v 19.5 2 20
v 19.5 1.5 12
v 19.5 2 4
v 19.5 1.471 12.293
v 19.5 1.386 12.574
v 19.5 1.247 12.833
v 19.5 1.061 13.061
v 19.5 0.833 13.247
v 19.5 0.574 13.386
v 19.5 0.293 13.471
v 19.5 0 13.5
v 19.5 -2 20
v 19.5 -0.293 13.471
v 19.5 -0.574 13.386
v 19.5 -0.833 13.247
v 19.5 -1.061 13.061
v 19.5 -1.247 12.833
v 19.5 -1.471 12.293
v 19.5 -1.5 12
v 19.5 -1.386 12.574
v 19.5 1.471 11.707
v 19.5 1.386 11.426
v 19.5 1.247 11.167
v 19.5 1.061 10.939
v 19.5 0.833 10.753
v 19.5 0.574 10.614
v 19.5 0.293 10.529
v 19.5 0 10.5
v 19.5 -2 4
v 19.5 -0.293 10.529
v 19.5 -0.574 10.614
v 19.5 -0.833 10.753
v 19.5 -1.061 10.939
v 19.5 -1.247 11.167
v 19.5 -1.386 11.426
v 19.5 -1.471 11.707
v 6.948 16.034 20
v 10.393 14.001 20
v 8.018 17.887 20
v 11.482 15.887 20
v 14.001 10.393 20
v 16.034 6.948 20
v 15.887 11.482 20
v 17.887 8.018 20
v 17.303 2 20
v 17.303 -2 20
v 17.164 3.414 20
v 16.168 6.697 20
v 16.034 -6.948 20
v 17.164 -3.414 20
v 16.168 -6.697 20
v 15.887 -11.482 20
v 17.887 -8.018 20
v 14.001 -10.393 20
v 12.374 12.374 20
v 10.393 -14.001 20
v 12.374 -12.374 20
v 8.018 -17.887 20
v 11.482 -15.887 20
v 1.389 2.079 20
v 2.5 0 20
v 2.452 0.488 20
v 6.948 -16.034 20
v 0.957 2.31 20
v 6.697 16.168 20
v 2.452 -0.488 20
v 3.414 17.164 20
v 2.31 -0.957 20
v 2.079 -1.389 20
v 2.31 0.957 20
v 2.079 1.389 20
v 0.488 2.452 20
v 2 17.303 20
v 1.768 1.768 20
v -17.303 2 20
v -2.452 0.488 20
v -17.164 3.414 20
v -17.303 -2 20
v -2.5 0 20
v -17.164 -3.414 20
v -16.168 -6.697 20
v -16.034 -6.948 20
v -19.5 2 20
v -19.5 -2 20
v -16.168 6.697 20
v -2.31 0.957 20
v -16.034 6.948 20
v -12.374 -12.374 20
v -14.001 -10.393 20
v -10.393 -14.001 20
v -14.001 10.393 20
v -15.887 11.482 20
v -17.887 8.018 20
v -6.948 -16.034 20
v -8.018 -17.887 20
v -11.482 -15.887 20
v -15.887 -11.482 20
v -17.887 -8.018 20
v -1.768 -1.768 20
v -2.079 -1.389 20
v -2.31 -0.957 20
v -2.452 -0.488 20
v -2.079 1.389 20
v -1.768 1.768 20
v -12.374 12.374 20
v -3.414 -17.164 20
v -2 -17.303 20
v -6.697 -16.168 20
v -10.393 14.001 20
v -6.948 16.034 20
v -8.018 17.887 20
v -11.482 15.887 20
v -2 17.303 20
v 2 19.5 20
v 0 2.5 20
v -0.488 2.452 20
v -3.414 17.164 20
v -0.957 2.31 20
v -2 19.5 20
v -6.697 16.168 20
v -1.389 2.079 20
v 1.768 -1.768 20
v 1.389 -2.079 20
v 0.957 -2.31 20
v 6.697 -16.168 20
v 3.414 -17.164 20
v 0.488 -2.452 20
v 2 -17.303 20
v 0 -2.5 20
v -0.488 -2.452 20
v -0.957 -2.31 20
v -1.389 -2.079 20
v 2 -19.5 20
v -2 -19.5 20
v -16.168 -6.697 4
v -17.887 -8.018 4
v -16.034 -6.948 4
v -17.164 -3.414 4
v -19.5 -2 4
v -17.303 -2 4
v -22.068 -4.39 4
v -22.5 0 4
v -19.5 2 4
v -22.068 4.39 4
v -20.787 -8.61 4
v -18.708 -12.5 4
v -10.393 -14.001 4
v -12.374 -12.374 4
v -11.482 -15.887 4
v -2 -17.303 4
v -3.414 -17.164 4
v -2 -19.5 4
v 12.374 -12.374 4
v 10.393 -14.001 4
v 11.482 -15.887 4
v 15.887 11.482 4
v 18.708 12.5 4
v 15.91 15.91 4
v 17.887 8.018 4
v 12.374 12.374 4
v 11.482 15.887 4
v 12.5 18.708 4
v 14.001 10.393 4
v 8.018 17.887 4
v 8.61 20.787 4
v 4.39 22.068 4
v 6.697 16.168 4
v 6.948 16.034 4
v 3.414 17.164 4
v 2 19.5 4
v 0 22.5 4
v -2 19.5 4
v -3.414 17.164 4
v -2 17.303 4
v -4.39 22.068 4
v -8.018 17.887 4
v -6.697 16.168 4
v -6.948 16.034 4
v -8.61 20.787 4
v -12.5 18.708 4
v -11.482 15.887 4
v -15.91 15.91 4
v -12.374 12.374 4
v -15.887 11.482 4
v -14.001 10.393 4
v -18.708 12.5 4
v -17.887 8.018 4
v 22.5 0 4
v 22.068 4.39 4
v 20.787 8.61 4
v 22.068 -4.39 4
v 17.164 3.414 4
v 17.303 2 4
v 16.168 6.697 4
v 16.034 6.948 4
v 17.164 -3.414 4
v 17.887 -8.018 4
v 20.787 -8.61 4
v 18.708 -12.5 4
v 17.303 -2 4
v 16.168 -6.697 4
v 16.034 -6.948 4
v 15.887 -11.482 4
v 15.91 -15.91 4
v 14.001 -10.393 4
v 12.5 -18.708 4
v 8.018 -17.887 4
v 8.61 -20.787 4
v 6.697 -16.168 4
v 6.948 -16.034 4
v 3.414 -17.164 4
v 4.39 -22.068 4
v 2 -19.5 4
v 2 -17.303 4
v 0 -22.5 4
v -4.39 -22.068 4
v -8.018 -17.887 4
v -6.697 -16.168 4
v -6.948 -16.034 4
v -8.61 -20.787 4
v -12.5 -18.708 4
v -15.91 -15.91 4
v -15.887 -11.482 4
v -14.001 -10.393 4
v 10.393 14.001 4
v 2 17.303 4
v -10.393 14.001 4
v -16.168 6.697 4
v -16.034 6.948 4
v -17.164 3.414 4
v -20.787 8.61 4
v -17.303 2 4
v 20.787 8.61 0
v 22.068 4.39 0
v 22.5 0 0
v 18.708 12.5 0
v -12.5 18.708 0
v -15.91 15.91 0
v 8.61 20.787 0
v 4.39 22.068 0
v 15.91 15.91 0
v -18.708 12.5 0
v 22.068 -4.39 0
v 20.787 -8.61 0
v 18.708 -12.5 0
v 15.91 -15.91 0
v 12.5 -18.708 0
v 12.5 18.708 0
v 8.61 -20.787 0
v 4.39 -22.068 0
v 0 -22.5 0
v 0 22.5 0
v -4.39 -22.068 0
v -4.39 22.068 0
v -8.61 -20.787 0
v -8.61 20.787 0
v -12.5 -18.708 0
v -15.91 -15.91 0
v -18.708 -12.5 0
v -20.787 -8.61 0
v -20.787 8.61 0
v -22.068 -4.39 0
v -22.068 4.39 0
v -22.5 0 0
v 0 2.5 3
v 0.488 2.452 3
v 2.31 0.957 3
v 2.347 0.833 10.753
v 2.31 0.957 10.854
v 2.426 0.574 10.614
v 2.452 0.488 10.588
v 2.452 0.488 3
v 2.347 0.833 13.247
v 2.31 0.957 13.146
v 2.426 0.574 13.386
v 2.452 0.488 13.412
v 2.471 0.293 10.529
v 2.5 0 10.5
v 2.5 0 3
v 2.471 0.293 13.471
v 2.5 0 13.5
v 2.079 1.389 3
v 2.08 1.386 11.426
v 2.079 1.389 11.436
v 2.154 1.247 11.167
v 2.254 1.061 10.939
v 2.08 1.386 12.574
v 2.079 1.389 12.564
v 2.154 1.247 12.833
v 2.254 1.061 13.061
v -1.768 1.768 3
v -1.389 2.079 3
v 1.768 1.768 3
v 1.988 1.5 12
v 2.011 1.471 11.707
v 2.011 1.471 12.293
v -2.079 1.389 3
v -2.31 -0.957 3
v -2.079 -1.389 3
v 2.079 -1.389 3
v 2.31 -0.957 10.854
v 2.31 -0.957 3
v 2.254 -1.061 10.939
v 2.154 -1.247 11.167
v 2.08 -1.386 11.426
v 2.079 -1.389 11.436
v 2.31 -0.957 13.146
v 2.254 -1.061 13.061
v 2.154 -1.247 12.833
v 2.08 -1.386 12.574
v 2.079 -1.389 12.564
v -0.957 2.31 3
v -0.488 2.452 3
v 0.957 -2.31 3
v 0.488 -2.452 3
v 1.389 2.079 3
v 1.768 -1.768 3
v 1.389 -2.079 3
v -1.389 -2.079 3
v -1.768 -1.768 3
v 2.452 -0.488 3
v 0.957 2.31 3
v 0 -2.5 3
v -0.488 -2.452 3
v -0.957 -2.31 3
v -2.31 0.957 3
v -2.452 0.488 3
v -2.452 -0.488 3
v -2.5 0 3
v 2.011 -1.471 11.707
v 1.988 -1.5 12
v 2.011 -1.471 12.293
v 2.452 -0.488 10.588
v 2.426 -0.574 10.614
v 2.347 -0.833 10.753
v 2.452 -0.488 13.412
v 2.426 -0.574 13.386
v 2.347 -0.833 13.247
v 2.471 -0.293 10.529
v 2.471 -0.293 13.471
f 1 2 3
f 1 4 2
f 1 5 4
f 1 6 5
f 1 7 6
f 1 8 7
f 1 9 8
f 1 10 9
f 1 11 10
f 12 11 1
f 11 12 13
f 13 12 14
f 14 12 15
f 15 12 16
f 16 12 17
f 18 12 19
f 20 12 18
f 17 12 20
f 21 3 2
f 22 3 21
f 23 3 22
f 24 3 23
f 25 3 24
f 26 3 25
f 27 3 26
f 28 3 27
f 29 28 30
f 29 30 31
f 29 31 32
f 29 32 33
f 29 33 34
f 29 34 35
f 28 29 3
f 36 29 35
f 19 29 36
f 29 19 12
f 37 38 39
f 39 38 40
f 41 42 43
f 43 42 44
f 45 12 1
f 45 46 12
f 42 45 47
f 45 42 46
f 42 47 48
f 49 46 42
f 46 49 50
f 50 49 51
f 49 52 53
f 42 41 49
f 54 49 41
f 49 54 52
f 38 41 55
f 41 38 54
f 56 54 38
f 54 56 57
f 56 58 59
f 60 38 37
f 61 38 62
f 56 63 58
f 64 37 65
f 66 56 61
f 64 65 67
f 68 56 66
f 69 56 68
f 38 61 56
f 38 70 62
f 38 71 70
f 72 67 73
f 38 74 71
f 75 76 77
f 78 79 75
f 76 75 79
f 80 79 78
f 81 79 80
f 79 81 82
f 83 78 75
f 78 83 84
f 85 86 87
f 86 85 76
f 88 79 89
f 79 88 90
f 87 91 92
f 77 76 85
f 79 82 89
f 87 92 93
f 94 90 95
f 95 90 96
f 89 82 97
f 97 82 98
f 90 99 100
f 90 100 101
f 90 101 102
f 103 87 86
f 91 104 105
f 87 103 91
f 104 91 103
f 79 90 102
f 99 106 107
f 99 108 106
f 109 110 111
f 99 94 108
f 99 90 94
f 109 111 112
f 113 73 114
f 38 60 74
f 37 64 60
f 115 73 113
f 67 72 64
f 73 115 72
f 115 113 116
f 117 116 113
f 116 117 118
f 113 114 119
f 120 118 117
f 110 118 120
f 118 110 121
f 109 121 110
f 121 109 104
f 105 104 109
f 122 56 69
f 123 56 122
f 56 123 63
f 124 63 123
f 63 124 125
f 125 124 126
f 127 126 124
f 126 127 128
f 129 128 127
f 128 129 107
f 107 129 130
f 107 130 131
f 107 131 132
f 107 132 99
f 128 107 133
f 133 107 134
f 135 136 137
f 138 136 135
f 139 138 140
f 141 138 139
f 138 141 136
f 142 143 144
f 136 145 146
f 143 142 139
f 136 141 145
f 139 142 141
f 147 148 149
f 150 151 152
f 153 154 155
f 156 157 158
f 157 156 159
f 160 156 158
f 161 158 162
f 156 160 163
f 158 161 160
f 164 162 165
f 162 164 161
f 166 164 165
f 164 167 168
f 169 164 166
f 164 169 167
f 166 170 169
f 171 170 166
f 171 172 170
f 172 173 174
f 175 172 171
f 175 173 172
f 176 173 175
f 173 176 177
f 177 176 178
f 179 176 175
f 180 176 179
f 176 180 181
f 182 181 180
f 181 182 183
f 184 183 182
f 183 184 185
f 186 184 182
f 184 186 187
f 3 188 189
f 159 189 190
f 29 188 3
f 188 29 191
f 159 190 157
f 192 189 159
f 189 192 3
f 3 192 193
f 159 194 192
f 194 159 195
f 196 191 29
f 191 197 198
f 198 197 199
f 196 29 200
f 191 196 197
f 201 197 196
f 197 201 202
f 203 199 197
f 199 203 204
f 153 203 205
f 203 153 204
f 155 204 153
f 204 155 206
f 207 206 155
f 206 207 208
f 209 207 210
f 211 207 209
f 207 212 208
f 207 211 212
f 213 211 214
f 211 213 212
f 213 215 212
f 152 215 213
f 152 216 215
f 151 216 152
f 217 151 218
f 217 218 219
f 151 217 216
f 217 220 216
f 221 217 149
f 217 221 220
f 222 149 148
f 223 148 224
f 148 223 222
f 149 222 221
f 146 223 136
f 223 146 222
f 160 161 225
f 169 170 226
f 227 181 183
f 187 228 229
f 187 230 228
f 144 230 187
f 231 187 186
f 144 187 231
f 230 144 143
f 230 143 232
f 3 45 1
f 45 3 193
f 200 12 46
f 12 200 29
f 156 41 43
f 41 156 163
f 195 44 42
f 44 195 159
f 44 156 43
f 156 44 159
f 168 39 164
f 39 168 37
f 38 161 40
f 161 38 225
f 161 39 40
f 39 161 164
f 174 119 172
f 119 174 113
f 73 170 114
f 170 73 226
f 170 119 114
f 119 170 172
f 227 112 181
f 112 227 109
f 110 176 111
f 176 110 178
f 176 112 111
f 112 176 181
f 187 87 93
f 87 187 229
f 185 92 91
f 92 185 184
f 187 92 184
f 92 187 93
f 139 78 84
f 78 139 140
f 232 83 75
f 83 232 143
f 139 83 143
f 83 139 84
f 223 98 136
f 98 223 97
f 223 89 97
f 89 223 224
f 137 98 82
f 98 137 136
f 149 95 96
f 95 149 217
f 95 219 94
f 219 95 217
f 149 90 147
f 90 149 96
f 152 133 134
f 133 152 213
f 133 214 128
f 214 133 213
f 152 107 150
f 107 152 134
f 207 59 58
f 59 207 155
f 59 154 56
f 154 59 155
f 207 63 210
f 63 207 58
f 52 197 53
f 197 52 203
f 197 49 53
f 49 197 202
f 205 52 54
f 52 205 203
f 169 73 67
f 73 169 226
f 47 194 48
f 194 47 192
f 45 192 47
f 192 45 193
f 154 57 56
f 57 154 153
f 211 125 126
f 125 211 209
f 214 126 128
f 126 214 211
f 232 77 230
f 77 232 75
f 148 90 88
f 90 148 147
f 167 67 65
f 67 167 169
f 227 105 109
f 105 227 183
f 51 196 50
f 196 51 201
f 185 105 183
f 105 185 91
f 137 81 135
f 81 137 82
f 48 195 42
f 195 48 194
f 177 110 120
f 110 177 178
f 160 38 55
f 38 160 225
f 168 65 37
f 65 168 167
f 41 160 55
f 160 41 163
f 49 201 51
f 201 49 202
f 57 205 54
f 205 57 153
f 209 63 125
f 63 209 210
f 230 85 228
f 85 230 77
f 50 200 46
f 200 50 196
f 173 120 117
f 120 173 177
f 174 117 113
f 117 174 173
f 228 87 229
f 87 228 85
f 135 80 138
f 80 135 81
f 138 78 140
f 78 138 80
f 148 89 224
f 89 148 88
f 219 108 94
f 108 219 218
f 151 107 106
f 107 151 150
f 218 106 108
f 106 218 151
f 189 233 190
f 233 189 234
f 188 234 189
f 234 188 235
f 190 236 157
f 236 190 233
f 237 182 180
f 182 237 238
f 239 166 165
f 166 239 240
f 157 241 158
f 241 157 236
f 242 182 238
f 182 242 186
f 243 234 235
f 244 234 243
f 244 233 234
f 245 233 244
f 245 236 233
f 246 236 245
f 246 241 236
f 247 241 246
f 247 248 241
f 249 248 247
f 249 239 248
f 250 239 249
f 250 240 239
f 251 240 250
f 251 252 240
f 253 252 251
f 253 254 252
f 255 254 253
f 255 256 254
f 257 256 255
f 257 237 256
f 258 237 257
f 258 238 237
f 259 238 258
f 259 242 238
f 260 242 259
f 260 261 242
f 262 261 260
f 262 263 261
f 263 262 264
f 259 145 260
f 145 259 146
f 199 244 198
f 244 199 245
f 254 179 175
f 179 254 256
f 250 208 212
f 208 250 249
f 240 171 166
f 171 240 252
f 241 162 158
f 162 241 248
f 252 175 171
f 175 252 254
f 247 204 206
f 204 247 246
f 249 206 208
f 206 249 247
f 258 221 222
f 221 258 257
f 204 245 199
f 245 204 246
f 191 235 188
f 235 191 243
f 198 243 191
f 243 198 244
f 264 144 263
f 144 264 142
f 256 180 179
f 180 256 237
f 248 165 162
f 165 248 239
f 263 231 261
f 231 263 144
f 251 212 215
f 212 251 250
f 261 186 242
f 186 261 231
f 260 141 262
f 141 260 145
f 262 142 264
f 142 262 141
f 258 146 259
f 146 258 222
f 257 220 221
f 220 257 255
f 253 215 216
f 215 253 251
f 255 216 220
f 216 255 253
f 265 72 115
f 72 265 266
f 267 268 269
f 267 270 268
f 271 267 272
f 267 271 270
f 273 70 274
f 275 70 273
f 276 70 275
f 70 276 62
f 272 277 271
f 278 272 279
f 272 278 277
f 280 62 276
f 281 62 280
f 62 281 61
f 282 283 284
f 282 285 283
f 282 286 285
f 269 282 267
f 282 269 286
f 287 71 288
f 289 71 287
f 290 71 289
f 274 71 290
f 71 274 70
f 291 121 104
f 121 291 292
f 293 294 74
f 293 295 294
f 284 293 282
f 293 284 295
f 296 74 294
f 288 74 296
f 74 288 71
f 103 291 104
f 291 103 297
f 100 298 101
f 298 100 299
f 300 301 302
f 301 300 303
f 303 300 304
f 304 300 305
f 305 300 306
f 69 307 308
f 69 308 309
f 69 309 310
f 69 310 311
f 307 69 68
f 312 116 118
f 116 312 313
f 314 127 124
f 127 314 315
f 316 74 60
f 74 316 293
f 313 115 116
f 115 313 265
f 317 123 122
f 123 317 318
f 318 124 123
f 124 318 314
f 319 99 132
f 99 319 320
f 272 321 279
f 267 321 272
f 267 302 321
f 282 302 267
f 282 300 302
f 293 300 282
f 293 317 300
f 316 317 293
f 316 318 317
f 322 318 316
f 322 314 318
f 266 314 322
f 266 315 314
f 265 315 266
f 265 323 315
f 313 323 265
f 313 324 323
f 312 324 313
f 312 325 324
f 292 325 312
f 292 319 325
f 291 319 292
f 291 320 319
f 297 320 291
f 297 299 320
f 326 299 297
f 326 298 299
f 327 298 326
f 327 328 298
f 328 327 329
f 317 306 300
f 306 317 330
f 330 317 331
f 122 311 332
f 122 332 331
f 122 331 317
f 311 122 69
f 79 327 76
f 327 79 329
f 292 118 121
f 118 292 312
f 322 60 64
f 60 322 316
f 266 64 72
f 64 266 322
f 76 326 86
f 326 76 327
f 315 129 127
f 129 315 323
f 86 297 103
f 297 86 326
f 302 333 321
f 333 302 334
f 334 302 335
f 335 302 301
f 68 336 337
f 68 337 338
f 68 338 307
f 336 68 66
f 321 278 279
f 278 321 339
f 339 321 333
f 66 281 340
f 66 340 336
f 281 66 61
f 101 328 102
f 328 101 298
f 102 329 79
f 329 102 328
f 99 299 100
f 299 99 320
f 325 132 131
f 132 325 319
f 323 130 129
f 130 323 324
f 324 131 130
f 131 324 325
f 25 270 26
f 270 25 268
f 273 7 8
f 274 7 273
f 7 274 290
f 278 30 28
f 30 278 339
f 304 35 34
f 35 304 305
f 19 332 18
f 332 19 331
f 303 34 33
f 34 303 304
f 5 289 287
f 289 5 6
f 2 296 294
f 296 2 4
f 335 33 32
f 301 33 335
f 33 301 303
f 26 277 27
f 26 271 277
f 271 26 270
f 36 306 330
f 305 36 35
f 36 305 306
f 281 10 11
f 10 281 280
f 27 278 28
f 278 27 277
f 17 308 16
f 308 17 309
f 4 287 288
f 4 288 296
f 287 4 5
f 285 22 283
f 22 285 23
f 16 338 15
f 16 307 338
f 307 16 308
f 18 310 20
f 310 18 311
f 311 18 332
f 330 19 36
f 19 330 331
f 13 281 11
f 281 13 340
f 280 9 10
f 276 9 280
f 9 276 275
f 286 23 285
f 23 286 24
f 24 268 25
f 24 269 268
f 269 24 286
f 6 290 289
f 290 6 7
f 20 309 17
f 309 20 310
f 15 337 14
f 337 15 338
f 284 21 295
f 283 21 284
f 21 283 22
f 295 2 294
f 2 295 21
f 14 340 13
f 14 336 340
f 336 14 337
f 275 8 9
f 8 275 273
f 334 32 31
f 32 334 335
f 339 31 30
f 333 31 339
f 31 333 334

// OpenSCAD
$fn = 32;

// ----------------------------------------------------------------------
// Control knob: skirt knob with grip ribs
// ----------------------------------------------------------------------

// --- parameters (mm) ---
skirt_d = 45;             // skirt diameter
skirt_t = 4;              // skirt thickness
rib_w = 4;                // grip rib width
rib_out = 3;              // grip rib radial protrusion
n_ribs = 12;              // number of grip ribs
knob_d = 35;              // knob body diameter
knob_h = 16;              // knob body height
bore_d = 5;               // shaft bore diameter
set_d = 3;                // set screw bore diameter

rib_step = 360 / n_ribs;  // rib angular step
total_h = skirt_t + knob_h;  // overall height

difference() {
  union() {
    translate([0, 0, skirt_t]) cylinder(h = knob_h, d = knob_d);
    cylinder(h = skirt_t, d = skirt_d);
    for (i = [0 : n_ribs - 1])
      rotate([0, 0, i * rib_step])
        translate([knob_d / 2 - 1, -rib_w / 2, skirt_t])
          cube([rib_out, rib_w, knob_h]);
  }
  translate([0, 0, skirt_t - 1]) cylinder(h = knob_h + 2, d = bore_d);
  translate([-1, 0, skirt_t + knob_h / 2]) rotate([0, 90, 0])
    cylinder(h = knob_d / 2 + bore_d / 2 + 2, d = set_d);
}
